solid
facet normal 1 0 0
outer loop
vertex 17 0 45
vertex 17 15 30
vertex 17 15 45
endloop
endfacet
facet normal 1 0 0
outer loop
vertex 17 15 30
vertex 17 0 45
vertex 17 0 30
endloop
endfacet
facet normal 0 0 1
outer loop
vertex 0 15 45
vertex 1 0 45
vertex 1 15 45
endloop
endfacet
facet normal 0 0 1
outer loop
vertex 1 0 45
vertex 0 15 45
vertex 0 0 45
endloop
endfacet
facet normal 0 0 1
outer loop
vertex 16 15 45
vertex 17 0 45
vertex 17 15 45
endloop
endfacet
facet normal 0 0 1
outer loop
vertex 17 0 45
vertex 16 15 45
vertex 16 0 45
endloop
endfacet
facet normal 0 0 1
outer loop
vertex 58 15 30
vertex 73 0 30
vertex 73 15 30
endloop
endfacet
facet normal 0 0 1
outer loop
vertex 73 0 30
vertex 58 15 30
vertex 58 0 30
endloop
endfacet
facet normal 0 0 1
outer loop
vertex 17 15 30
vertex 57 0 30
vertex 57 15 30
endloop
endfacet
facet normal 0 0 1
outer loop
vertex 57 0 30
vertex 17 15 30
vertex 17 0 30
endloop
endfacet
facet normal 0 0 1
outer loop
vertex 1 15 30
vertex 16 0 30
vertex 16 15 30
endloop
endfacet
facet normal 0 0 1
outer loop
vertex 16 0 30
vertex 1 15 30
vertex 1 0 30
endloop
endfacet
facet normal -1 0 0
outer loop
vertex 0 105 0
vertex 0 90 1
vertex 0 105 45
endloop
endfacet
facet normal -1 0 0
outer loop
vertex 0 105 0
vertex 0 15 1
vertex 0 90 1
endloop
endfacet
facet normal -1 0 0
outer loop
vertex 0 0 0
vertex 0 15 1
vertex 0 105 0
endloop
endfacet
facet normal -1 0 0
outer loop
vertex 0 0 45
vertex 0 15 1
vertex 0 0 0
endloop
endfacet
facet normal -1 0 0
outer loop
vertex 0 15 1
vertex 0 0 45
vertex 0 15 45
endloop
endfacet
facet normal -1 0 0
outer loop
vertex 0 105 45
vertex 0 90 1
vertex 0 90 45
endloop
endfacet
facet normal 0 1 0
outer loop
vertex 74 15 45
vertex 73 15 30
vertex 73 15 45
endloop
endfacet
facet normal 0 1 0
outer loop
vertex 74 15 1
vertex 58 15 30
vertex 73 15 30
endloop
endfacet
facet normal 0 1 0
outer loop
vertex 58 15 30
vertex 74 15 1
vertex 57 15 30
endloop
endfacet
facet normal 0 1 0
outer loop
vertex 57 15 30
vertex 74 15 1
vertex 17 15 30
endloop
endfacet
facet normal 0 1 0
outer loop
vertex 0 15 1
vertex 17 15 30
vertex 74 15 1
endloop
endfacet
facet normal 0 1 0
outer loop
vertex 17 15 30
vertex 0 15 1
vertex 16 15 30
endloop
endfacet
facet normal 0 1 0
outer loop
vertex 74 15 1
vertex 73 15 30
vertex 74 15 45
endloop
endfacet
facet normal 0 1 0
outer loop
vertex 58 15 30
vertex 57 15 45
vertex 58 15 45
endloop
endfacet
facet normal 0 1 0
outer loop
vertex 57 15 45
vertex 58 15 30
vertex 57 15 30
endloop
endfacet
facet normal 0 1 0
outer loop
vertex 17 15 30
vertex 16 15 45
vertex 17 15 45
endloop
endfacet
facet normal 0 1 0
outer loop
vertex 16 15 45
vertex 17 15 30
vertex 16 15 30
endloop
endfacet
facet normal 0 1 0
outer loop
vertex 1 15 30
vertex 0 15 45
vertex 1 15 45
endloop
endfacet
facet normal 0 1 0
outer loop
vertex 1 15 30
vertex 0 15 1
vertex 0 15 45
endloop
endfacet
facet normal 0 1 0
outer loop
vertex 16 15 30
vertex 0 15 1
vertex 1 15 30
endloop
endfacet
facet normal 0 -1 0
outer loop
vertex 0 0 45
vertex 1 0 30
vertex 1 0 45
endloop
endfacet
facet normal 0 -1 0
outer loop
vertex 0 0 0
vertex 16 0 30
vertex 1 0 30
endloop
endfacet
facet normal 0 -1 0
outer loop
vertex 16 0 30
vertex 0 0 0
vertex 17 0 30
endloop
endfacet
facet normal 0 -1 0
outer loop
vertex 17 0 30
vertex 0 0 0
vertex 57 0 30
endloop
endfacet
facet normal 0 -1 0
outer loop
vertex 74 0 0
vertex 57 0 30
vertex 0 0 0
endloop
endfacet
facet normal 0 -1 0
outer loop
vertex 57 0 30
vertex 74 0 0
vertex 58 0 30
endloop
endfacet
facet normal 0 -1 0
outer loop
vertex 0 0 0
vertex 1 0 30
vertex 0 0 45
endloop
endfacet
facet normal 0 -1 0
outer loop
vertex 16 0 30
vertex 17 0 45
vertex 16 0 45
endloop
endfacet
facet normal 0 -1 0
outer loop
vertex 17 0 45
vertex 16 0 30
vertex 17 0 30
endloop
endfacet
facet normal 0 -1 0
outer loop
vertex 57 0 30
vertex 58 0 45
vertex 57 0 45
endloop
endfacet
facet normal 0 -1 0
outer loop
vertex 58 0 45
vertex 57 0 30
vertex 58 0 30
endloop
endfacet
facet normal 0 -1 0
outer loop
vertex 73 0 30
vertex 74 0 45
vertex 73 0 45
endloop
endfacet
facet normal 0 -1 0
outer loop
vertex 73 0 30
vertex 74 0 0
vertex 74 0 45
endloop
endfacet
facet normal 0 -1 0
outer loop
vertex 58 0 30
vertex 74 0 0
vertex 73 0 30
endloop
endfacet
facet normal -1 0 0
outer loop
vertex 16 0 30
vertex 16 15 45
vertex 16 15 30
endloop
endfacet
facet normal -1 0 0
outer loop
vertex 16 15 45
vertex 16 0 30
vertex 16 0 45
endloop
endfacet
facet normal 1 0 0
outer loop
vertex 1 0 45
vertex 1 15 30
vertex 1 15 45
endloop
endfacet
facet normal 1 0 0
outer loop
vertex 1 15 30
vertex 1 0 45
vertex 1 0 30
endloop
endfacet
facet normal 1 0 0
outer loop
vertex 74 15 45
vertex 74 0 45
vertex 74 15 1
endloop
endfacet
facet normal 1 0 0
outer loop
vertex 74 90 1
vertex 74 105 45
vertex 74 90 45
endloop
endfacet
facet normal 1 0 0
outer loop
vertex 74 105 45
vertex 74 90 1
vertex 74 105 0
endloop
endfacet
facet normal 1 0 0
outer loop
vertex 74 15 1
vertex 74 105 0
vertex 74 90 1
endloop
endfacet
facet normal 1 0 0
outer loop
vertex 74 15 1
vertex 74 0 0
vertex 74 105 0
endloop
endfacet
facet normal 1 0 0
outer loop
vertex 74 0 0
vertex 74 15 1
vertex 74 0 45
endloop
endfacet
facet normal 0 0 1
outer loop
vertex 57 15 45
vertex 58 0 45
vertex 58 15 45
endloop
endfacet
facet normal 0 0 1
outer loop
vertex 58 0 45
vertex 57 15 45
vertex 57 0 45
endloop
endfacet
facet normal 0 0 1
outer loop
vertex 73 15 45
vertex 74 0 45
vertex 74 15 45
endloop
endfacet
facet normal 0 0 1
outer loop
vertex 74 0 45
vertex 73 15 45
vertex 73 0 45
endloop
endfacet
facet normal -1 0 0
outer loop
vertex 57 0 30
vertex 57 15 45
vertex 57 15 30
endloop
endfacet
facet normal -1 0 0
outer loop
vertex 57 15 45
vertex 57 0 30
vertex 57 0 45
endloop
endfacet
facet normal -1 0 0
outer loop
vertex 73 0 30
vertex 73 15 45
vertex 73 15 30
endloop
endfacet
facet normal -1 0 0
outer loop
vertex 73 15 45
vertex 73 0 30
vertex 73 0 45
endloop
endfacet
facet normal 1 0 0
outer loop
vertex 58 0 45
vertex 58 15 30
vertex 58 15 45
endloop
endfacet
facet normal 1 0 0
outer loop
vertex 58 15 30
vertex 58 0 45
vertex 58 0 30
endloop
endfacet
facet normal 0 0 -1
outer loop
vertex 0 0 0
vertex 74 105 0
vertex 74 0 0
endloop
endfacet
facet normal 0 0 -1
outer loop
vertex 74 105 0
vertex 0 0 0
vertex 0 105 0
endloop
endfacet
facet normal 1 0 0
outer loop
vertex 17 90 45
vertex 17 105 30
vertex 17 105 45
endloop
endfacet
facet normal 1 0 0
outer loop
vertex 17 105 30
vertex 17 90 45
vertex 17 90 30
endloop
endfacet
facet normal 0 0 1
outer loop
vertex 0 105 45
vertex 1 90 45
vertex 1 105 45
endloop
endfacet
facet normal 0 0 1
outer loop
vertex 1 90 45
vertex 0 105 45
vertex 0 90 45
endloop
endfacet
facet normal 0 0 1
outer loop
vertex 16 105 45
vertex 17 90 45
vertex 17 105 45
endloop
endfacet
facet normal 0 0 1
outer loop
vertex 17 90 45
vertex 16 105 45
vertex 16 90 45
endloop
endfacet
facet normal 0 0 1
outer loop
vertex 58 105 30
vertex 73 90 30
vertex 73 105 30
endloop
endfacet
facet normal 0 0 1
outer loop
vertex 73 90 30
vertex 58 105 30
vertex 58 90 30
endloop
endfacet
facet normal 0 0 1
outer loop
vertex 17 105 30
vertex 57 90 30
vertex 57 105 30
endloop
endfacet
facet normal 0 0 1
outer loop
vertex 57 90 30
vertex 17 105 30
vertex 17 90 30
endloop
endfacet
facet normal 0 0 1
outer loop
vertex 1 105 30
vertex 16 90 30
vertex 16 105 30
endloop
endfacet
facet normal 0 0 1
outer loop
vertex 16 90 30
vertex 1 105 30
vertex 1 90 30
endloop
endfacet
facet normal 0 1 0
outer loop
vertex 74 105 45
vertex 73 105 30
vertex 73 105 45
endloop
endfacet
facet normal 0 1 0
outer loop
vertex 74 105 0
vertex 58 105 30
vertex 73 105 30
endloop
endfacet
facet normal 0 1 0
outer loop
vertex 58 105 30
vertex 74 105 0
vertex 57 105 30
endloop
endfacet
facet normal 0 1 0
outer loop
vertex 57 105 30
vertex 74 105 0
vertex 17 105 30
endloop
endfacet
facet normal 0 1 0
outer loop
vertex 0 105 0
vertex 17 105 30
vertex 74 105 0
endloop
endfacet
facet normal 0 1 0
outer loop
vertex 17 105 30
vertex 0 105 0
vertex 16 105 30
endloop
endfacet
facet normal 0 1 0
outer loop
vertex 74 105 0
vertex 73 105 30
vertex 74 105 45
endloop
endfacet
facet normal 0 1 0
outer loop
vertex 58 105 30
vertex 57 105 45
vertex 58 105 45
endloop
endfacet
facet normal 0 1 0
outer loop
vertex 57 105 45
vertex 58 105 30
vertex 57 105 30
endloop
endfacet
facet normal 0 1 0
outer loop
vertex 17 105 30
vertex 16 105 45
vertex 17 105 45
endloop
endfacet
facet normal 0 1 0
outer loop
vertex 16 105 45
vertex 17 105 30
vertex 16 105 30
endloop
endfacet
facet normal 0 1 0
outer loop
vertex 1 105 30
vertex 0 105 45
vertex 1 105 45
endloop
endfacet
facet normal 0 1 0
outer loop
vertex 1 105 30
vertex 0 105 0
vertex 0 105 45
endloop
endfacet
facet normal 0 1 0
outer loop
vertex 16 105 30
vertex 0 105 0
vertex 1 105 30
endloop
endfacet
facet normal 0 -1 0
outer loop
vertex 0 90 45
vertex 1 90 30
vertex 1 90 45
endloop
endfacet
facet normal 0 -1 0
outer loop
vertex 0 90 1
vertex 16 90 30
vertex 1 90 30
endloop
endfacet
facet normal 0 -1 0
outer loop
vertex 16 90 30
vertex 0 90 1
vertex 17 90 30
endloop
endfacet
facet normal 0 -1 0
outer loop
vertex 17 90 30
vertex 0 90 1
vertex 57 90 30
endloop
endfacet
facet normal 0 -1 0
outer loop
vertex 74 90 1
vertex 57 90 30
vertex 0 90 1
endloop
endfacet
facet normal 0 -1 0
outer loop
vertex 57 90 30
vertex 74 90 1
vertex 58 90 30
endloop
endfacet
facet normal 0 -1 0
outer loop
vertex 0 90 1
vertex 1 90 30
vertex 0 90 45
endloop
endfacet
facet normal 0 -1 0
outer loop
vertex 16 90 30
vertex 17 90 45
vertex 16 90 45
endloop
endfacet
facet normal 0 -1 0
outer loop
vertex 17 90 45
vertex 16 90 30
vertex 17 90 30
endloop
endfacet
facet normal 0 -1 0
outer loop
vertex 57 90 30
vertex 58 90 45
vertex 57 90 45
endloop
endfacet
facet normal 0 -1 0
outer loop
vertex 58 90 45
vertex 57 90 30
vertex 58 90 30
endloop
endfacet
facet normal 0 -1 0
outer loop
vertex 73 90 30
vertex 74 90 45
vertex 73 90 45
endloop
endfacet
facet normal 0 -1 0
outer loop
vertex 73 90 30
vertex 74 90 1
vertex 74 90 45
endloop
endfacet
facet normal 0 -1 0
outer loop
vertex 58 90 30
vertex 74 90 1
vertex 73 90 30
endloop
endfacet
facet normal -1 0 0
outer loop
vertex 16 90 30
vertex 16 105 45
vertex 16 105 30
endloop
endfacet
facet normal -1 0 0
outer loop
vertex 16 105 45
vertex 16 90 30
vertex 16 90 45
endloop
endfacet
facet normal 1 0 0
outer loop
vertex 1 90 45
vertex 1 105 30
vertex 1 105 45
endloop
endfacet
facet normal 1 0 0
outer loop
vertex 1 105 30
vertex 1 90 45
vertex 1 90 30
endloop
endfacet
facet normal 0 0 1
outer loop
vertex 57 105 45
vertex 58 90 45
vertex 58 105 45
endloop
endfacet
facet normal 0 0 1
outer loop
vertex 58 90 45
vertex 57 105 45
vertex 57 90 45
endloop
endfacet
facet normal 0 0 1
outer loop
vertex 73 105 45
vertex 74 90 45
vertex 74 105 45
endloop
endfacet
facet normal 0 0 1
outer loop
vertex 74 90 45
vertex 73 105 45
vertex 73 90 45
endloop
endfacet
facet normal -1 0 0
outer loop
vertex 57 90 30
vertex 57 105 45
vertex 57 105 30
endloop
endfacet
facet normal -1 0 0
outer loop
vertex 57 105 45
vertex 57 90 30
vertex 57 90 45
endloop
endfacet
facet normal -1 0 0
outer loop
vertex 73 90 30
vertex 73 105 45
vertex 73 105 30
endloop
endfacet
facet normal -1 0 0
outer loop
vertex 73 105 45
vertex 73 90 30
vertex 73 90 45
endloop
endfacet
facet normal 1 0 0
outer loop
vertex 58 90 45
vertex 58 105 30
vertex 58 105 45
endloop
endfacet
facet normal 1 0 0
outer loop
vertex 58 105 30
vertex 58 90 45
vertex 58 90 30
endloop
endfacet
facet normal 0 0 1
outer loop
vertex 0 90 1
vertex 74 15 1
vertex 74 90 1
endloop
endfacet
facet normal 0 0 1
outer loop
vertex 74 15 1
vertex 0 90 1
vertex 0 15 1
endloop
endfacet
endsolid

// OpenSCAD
//15mm sides
//65mm displacement
//57mm displacement
disp=57;
h=30;

spacer();
translate([0,90,0]) spacer();
cube([disp+17,105,1]);
module spacer() {
translate([0,0,h-1]) {
translate([0,0,1]) difference() {
  cube([17,15,15]);
  translate([1,0,0]) cube([15,15,15]);
}
translate([disp,0,0]) {
translate([0,0,1]) difference() {
  cube([17,15,15]);
  translate([1,0,0]) cube([15,15,15]);
}
cube([17,15,1]);
}
cube([disp+17,15,1]);
}
cube([disp+17,15,30]);
}
